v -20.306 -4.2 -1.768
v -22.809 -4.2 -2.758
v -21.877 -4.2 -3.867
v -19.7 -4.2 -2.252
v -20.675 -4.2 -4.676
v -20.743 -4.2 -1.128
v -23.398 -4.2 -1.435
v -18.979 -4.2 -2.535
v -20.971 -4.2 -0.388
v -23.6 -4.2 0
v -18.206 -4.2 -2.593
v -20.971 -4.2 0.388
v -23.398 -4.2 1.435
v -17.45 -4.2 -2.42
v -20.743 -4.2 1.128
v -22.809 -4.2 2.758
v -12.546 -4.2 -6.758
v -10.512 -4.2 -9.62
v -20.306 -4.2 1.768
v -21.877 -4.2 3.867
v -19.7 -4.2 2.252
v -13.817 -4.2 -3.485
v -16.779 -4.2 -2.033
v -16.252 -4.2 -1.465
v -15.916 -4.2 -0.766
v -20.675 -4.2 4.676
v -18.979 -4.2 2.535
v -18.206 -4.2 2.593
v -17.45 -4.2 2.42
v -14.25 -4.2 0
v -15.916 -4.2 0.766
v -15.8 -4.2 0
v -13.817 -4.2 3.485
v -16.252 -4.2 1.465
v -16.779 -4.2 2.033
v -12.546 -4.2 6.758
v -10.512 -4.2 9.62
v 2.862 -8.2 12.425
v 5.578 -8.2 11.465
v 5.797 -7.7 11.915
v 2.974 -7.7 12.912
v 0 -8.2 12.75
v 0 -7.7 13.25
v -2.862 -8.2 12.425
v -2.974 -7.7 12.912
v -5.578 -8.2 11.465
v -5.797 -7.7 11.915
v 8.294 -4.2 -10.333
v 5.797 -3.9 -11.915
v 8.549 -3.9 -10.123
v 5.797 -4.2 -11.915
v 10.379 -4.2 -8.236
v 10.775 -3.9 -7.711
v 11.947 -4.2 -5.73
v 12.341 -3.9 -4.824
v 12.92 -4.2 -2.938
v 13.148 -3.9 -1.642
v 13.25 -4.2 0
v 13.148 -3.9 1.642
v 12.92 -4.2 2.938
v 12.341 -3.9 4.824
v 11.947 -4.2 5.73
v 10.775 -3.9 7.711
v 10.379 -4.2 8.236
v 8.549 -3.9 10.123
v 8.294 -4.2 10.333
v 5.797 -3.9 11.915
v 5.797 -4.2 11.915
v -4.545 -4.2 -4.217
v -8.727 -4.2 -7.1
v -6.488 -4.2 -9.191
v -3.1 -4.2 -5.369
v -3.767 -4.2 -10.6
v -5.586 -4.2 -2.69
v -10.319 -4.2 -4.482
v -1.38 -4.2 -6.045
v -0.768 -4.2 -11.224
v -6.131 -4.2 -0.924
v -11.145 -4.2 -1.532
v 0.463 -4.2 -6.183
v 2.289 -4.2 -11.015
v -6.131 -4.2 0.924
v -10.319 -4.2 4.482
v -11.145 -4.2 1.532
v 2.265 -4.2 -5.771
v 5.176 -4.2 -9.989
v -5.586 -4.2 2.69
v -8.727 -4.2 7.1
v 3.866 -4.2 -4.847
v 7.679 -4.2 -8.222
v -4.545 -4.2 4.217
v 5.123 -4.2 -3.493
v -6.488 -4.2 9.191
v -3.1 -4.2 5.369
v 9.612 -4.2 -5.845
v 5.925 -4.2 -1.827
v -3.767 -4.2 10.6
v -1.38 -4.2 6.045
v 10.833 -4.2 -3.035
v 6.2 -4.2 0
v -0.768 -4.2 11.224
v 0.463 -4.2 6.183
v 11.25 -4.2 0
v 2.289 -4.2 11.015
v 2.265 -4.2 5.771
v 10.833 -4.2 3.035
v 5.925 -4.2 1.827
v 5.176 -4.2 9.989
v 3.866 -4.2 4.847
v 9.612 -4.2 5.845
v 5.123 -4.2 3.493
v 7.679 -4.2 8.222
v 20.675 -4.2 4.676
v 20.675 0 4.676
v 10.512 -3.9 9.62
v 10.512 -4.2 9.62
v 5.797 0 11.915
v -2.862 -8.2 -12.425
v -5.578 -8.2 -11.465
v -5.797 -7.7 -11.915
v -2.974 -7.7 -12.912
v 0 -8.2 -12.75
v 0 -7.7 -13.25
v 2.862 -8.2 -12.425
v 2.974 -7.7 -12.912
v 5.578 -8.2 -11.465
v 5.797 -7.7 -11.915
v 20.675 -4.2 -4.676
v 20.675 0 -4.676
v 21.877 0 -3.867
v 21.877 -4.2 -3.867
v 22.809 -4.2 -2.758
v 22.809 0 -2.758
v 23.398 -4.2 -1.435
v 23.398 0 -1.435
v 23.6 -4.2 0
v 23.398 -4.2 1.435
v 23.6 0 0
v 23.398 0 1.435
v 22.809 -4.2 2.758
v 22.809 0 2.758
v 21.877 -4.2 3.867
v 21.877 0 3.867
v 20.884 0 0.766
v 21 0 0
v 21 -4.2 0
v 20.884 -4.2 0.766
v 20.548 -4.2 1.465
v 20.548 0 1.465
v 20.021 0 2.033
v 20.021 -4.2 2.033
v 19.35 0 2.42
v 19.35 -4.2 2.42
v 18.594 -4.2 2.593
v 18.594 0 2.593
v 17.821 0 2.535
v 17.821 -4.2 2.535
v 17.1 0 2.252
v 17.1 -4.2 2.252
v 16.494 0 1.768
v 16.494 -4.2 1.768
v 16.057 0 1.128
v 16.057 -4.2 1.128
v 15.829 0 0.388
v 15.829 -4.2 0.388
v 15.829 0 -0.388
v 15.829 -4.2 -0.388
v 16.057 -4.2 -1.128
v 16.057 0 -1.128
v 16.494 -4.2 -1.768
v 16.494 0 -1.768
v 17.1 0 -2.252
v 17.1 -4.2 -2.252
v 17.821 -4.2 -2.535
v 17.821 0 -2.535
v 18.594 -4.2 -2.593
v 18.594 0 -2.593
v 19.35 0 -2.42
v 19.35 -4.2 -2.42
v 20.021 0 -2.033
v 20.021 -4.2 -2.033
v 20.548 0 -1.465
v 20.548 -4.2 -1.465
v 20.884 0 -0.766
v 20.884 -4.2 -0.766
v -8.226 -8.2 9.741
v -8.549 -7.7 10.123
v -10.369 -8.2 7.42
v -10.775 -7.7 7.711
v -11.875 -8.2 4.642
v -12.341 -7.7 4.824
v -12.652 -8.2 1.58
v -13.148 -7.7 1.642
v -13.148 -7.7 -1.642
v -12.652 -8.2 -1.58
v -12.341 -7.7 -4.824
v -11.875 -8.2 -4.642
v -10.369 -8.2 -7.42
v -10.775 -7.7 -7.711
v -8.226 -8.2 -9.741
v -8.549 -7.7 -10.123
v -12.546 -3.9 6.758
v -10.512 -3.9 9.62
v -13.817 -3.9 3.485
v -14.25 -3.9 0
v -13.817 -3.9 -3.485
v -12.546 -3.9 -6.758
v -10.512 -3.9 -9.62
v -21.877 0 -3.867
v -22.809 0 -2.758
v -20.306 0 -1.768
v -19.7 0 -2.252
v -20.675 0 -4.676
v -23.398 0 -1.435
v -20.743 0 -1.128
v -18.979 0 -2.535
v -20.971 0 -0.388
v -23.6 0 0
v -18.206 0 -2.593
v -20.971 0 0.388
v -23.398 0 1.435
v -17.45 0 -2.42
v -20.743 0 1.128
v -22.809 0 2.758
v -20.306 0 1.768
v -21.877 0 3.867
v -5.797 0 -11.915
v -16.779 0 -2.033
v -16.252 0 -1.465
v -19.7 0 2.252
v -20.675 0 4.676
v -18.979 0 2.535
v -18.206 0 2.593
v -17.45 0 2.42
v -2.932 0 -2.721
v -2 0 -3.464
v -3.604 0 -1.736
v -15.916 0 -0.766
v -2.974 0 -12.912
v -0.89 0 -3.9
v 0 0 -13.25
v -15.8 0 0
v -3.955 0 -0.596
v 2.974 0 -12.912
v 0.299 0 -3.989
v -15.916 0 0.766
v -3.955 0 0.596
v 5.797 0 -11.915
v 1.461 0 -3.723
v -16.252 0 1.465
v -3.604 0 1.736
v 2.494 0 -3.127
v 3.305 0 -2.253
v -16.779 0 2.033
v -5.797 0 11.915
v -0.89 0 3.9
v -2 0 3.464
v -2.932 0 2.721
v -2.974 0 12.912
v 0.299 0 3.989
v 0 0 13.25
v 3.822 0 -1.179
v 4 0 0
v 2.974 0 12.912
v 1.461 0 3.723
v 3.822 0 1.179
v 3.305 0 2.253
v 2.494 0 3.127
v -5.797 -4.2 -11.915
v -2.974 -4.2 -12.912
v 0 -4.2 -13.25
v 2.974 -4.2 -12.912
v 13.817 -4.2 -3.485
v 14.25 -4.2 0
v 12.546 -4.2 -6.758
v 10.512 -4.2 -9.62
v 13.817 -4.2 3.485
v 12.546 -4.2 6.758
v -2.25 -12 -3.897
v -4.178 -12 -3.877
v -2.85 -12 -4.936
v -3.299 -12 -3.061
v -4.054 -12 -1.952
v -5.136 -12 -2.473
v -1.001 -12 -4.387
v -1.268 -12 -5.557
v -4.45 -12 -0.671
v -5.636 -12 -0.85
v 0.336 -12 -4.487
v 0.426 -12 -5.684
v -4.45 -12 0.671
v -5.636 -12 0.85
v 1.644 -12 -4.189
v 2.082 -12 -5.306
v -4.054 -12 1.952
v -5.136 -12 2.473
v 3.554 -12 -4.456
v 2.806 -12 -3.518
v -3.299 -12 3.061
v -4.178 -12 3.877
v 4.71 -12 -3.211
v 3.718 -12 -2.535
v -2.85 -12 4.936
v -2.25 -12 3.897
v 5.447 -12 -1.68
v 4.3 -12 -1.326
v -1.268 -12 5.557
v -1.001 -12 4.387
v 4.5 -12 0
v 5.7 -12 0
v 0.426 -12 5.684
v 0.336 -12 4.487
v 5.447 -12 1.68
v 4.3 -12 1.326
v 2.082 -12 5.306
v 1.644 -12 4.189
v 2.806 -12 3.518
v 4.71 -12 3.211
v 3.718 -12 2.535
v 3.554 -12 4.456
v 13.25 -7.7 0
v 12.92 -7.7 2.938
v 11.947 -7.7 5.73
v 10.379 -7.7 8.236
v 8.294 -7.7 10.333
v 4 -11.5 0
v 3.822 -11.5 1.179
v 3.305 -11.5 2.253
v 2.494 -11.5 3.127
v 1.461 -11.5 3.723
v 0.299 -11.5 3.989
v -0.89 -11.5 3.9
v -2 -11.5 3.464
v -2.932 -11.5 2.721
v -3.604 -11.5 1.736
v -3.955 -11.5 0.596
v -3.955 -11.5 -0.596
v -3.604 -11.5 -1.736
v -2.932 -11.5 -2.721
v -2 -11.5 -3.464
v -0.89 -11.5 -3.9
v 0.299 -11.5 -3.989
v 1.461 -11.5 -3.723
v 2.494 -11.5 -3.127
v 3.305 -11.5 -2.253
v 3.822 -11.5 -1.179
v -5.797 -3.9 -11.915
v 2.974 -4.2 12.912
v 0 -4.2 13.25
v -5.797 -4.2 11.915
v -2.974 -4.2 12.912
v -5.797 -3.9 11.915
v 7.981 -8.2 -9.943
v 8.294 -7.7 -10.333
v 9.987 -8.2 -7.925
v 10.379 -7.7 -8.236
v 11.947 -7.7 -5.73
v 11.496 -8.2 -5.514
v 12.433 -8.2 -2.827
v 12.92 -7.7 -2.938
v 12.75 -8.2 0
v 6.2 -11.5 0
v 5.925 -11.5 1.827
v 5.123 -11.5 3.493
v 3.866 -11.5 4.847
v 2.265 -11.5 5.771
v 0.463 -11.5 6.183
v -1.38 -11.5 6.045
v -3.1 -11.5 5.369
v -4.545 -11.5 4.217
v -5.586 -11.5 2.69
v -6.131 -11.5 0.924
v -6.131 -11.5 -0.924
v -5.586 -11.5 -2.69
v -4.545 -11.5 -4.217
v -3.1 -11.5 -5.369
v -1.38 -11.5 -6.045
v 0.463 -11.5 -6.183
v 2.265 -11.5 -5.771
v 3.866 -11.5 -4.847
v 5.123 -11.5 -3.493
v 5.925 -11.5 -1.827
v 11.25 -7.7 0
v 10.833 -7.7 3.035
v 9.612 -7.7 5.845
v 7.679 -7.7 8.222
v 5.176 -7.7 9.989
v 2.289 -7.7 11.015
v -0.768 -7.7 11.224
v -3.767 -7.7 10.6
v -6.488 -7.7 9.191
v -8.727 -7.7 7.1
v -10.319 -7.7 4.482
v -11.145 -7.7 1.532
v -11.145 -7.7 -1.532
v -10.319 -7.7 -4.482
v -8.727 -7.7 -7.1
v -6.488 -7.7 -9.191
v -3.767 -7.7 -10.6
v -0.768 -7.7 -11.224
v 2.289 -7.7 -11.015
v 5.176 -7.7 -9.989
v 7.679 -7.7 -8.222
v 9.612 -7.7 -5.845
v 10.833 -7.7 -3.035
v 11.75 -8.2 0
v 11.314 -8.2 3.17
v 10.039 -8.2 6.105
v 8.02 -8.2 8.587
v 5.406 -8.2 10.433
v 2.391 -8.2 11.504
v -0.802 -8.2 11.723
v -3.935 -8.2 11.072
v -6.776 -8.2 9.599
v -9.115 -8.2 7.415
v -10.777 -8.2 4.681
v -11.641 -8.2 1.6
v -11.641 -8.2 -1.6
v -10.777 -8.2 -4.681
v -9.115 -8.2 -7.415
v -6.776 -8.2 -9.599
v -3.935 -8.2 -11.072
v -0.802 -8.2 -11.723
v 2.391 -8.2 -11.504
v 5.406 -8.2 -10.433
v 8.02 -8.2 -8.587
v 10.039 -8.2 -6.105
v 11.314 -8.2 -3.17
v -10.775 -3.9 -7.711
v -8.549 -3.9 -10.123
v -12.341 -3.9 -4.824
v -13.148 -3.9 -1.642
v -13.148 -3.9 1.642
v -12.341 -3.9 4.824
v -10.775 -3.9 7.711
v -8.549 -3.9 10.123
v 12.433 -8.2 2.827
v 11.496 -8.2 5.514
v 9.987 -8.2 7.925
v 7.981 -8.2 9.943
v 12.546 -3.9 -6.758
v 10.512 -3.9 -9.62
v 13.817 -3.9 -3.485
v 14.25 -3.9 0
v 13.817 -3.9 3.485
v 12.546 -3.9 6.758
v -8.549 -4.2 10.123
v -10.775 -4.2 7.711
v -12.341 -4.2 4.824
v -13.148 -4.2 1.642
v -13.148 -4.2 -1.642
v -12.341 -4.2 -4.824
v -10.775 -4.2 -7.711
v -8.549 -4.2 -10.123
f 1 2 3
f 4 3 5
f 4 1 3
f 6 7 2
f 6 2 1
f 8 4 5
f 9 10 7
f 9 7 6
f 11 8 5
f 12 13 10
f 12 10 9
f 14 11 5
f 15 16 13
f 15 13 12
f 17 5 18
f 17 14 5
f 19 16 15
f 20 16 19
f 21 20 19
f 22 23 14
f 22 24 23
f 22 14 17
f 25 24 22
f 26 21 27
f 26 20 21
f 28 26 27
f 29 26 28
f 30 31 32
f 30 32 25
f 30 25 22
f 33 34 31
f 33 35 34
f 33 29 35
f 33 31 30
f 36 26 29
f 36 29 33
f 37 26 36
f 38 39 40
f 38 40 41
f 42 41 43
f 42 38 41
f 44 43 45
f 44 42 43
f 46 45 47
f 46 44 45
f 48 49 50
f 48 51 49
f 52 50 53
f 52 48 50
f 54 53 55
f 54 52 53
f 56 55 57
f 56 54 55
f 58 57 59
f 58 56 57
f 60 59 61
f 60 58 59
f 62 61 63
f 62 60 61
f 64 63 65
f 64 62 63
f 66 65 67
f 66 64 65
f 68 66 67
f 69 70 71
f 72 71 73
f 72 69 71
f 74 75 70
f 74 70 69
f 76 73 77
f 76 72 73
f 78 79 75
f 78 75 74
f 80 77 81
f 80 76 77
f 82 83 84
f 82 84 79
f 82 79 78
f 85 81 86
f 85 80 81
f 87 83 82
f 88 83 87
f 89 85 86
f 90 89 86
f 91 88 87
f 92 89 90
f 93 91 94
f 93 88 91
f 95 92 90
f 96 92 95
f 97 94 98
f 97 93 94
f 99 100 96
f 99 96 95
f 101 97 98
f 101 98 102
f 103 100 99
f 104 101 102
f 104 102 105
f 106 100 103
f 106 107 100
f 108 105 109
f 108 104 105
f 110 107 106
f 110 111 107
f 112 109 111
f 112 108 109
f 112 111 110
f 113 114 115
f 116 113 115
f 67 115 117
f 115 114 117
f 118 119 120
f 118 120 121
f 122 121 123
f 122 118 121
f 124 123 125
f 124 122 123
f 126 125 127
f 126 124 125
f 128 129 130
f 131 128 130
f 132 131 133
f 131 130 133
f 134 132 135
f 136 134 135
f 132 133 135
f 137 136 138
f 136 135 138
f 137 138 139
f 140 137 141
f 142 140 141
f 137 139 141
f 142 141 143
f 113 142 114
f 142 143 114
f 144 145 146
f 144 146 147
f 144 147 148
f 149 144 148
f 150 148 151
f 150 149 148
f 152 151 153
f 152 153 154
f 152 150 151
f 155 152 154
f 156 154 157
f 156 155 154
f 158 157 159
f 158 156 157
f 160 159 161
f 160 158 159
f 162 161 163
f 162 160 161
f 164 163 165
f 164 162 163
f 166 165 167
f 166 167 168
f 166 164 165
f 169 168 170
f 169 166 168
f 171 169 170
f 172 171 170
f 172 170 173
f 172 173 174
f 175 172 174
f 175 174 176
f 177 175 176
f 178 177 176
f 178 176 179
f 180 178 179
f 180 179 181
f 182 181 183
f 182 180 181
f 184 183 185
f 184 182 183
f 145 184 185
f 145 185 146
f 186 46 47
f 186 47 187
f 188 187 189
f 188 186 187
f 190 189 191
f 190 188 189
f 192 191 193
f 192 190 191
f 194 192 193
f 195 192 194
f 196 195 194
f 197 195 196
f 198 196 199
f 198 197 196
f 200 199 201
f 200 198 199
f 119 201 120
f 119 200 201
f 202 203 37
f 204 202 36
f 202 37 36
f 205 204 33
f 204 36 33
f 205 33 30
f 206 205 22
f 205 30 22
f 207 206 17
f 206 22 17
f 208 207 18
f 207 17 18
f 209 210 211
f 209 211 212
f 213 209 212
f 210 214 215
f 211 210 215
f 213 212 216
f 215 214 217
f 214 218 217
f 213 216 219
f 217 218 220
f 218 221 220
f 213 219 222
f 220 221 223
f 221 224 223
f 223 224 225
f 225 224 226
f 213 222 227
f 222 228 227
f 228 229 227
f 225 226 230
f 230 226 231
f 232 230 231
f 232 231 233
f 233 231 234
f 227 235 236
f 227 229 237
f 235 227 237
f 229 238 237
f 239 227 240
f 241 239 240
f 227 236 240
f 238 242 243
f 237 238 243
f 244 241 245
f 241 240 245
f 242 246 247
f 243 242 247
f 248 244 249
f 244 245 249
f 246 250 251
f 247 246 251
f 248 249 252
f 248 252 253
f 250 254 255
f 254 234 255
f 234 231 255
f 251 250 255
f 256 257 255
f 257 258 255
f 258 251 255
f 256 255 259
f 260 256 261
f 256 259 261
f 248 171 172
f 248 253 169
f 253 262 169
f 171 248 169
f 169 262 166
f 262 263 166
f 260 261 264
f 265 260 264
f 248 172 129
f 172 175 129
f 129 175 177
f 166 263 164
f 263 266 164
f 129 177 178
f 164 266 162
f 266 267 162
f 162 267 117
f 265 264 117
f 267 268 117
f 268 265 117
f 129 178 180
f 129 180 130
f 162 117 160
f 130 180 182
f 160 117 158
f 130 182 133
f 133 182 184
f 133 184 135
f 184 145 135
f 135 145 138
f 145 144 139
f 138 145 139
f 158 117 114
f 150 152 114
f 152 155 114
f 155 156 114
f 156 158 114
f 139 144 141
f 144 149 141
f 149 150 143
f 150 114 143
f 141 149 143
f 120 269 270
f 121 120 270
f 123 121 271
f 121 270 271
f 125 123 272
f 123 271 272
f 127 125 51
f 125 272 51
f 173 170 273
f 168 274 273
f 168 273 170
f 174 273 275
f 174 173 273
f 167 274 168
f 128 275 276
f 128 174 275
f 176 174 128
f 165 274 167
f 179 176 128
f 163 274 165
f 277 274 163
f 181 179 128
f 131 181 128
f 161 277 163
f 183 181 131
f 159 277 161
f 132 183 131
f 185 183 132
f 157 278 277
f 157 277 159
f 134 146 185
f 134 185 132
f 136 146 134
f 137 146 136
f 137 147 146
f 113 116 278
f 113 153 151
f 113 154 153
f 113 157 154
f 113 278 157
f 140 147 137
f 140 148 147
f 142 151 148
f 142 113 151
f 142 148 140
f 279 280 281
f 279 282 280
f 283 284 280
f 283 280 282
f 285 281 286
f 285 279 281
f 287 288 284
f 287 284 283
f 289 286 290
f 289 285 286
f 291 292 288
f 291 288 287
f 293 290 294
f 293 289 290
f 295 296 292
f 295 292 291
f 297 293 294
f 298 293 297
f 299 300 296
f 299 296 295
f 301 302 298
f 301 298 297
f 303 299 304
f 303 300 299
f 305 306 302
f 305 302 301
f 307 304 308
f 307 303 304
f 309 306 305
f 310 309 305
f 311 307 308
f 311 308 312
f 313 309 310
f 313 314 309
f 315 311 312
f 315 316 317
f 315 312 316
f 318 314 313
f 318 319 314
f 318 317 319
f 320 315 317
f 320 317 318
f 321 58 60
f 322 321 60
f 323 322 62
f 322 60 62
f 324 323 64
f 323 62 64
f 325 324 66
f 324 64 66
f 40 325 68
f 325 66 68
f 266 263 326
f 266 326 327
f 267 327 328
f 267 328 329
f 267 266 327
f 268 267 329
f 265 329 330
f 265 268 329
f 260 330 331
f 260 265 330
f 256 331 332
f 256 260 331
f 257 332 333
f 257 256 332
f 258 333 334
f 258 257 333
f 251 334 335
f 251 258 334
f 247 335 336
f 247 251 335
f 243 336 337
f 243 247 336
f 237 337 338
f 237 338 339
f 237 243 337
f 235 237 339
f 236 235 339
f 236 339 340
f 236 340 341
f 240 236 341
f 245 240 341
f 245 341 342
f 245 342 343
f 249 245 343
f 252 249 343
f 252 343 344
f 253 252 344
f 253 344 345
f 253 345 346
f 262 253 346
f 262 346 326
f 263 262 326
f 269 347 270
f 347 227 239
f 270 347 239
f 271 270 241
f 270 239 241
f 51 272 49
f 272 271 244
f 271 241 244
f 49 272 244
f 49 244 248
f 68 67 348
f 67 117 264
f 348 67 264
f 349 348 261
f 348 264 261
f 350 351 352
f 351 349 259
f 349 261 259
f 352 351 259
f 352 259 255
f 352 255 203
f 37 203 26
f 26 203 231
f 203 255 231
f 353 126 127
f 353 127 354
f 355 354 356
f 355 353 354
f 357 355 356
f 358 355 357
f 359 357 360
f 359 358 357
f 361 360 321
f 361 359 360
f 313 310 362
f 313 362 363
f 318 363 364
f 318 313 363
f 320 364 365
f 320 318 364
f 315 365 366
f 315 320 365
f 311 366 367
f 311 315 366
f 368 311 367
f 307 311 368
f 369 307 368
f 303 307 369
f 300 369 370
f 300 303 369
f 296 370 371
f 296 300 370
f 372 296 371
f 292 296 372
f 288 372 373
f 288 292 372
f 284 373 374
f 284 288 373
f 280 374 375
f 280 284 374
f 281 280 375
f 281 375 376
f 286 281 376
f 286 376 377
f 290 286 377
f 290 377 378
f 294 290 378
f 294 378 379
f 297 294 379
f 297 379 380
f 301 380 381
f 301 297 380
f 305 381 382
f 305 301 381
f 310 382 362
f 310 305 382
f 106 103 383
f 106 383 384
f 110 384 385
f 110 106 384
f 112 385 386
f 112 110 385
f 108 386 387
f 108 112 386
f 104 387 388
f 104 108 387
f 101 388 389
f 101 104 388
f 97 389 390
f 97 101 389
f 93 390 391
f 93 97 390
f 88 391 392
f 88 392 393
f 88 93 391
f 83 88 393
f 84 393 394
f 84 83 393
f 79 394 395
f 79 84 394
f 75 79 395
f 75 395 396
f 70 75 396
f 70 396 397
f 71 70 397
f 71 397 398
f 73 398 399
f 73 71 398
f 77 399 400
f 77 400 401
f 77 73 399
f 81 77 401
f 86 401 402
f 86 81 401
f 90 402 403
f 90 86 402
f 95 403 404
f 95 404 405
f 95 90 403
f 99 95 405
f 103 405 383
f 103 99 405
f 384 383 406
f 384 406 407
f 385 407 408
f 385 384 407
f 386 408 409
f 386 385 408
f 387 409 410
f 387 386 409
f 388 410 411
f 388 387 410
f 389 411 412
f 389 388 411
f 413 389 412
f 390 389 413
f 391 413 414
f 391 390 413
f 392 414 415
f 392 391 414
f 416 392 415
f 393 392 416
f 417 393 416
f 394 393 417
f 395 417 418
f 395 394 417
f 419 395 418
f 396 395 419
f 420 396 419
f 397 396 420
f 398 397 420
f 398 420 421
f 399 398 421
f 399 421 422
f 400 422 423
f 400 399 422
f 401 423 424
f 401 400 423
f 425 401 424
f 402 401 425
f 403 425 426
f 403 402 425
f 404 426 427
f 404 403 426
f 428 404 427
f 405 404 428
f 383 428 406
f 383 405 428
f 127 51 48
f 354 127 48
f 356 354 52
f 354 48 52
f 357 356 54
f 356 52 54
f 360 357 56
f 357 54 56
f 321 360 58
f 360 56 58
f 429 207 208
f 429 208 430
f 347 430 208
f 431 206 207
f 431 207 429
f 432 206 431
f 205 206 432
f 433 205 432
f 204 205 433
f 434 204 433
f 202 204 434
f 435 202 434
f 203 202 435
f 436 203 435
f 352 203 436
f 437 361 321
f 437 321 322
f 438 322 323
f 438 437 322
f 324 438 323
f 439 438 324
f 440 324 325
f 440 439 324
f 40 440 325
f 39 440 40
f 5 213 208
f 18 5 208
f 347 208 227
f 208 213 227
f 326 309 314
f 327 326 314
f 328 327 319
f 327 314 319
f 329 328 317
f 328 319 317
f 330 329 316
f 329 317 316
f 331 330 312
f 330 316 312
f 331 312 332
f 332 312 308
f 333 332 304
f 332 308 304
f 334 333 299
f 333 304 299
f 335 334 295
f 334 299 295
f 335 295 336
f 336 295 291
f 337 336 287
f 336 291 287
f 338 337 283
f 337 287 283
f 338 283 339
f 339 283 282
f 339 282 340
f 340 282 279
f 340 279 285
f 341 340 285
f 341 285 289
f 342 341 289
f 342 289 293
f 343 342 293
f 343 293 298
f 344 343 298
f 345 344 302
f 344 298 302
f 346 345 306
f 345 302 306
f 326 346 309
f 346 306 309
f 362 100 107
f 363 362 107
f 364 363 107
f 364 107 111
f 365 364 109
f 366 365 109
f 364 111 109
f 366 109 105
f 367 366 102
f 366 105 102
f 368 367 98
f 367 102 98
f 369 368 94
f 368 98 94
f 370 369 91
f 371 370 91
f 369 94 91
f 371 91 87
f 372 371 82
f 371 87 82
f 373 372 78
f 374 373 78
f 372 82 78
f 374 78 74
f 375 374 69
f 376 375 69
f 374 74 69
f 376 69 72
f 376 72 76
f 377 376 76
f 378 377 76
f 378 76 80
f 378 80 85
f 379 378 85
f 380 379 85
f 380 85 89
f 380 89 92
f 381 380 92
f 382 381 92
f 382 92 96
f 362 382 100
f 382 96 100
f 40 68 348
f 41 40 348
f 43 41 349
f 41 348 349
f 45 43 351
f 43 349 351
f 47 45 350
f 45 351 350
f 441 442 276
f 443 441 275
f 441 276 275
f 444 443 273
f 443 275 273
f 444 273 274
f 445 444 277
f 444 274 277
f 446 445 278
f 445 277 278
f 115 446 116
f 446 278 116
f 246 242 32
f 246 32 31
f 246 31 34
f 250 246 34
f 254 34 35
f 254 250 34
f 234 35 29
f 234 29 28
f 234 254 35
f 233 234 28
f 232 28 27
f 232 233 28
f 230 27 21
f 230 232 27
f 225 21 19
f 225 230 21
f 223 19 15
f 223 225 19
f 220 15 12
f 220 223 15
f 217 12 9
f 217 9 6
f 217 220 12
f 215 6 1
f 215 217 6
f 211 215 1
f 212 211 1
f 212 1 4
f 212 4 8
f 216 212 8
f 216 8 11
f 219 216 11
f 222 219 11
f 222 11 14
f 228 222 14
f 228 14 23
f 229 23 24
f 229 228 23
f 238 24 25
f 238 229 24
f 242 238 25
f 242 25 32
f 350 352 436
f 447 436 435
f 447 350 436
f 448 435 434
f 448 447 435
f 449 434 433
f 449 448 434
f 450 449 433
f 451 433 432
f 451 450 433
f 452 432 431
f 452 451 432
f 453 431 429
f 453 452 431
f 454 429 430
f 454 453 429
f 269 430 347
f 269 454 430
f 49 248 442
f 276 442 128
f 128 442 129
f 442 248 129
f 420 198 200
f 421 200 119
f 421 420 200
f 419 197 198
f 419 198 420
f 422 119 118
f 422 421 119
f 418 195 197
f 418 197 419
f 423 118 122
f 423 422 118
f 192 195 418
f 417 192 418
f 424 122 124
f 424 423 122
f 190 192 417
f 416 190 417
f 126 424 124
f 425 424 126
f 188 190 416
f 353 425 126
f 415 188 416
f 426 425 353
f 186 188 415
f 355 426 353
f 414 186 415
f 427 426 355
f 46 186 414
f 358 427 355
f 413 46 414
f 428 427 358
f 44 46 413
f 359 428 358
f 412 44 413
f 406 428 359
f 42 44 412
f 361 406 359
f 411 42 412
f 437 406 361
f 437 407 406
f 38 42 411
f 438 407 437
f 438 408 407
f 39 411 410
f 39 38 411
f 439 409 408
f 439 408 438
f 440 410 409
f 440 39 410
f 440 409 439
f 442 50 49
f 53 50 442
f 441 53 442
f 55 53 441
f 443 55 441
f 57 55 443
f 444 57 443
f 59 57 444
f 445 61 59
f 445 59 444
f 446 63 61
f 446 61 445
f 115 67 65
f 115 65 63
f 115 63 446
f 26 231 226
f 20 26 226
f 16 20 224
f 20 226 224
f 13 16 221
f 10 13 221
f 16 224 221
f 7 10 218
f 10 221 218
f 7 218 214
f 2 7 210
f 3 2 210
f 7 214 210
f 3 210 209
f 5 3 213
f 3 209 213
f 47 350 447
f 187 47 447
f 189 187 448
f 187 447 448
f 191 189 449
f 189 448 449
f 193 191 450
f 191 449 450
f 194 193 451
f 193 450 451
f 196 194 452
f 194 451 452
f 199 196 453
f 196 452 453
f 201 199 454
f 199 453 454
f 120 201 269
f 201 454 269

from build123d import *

# Parameters (mm, degrees)
F0_R     = 2.6
F0_R_2   = 4
F1_DEPTH = 4.2
F2_R     = 14.25
F2_R_2   = 13.25
F3_DEPTH = 0.3
F4_R     = 6.2
F4_R_2   = 4
F5_DEPTH = 7.8
F4_R_3   = 11.25
F6_DEPTH = 4
F7_SIZE  = 0.5


with BuildPart() as f1:
    # F0 (on Front) → F1 (new body)
    with BuildSketch(Plane.XZ):
        with BuildLine():
            ThreePointArc((-5.796875, -11.9146439407), (-13.25, 0), (-5.796875, 11.9146439407))
            Line((-5.796875, 11.9146439407), (-20.675, 4.6759357352))
            ThreePointArc((-20.675, 4.6759357352), (-23.6, 0), (-20.675, -4.6759357352))
            Line((-20.675, -4.6759357352), (-5.796875, -11.9146439407))
        make_face()
        with Locations((-18.4, 0)):
            Circle(F0_R, mode=Mode.SUBTRACT)
        with BuildLine():
            ThreePointArc((5.796875, -11.9146439407), (11.2332340346, -7.026873638), (13.25, 0))
            ThreePointArc((13.25, 0), (11.2332340346, 7.026873638), (5.796875, 11.9146439407))
            ThreePointArc((5.796875, 11.9146439407), (0, 13.25), (-5.796875, 11.9146439407))
            ThreePointArc((-5.796875, 11.9146439407), (-13.25, 0), (-5.796875, -11.9146439407))
            ThreePointArc((-5.796875, -11.9146439407), (0, -13.25), (5.796875, -11.9146439407))
        make_face()
        Circle(F0_R_2, mode=Mode.SUBTRACT)
        with BuildLine():
            ThreePointArc((5.796875, 11.9146439407), (11.2332340346, 7.026873638), (13.25, 0))
            ThreePointArc((13.25, 0), (11.2332340346, -7.026873638), (5.796875, -11.9146439407))
            Line((5.796875, -11.9146439407), (20.675, -4.6759357352))
            ThreePointArc((20.675, -4.6759357352), (23.6, 0), (20.675, 4.6759357352))
            Line((20.675, 4.6759357352), (5.796875, 11.9146439407))
        make_face()
        with Locations((18.4, 0)):
            Circle(F0_R, mode=Mode.SUBTRACT)
    extrude(amount=F1_DEPTH)

    # F2 (on face) → F3 (cut)
    with BuildSketch(Plane.XZ.offset(4.2)):
        Circle(F2_R)
        Circle(F2_R_2, mode=Mode.SUBTRACT)
    extrude(amount=-F3_DEPTH, mode=Mode.SUBTRACT)

    # F4 (on face) → F5 (join)
    with BuildSketch(Plane.XZ.offset(4.2)):
        Circle(F4_R)
        Circle(F4_R_2, mode=Mode.SUBTRACT)
    extrude(amount=F5_DEPTH)

    # F4 (on face) → F6 (join)
    with BuildSketch(Plane.XZ.offset(4.2)):
        with BuildLine():
            ThreePointArc((5.796875, -11.9146439407), (11.2332340346, -7.026873638), (13.25, 0))
            ThreePointArc((13.25, 0), (11.2332340346, 7.026873638), (5.796875, 11.9146439407))
            ThreePointArc((5.796875, 11.9146439407), (0, 13.25), (-5.796875, 11.9146439407))
            ThreePointArc((-5.796875, 11.9146439407), (-13.25, 0), (-5.796875, -11.9146439407))
            ThreePointArc((-5.796875, -11.9146439407), (0, -13.25), (5.796875, -11.9146439407))
        make_face()
        Circle(F4_R_3, mode=Mode.SUBTRACT)
    extrude(amount=F6_DEPTH)

    # F7
    f7_edges = [f1.edges().sort_by_distance(p)[0] for p in [
        (-4, -12, 0),
        (-6.2, -12, 0),
        (-11.25, -8.2, 0),
        (5.796875, -8.2, -11.914644),
    ]]
    chamfer(f7_edges, length=F7_SIZE)


solid = f1.part
